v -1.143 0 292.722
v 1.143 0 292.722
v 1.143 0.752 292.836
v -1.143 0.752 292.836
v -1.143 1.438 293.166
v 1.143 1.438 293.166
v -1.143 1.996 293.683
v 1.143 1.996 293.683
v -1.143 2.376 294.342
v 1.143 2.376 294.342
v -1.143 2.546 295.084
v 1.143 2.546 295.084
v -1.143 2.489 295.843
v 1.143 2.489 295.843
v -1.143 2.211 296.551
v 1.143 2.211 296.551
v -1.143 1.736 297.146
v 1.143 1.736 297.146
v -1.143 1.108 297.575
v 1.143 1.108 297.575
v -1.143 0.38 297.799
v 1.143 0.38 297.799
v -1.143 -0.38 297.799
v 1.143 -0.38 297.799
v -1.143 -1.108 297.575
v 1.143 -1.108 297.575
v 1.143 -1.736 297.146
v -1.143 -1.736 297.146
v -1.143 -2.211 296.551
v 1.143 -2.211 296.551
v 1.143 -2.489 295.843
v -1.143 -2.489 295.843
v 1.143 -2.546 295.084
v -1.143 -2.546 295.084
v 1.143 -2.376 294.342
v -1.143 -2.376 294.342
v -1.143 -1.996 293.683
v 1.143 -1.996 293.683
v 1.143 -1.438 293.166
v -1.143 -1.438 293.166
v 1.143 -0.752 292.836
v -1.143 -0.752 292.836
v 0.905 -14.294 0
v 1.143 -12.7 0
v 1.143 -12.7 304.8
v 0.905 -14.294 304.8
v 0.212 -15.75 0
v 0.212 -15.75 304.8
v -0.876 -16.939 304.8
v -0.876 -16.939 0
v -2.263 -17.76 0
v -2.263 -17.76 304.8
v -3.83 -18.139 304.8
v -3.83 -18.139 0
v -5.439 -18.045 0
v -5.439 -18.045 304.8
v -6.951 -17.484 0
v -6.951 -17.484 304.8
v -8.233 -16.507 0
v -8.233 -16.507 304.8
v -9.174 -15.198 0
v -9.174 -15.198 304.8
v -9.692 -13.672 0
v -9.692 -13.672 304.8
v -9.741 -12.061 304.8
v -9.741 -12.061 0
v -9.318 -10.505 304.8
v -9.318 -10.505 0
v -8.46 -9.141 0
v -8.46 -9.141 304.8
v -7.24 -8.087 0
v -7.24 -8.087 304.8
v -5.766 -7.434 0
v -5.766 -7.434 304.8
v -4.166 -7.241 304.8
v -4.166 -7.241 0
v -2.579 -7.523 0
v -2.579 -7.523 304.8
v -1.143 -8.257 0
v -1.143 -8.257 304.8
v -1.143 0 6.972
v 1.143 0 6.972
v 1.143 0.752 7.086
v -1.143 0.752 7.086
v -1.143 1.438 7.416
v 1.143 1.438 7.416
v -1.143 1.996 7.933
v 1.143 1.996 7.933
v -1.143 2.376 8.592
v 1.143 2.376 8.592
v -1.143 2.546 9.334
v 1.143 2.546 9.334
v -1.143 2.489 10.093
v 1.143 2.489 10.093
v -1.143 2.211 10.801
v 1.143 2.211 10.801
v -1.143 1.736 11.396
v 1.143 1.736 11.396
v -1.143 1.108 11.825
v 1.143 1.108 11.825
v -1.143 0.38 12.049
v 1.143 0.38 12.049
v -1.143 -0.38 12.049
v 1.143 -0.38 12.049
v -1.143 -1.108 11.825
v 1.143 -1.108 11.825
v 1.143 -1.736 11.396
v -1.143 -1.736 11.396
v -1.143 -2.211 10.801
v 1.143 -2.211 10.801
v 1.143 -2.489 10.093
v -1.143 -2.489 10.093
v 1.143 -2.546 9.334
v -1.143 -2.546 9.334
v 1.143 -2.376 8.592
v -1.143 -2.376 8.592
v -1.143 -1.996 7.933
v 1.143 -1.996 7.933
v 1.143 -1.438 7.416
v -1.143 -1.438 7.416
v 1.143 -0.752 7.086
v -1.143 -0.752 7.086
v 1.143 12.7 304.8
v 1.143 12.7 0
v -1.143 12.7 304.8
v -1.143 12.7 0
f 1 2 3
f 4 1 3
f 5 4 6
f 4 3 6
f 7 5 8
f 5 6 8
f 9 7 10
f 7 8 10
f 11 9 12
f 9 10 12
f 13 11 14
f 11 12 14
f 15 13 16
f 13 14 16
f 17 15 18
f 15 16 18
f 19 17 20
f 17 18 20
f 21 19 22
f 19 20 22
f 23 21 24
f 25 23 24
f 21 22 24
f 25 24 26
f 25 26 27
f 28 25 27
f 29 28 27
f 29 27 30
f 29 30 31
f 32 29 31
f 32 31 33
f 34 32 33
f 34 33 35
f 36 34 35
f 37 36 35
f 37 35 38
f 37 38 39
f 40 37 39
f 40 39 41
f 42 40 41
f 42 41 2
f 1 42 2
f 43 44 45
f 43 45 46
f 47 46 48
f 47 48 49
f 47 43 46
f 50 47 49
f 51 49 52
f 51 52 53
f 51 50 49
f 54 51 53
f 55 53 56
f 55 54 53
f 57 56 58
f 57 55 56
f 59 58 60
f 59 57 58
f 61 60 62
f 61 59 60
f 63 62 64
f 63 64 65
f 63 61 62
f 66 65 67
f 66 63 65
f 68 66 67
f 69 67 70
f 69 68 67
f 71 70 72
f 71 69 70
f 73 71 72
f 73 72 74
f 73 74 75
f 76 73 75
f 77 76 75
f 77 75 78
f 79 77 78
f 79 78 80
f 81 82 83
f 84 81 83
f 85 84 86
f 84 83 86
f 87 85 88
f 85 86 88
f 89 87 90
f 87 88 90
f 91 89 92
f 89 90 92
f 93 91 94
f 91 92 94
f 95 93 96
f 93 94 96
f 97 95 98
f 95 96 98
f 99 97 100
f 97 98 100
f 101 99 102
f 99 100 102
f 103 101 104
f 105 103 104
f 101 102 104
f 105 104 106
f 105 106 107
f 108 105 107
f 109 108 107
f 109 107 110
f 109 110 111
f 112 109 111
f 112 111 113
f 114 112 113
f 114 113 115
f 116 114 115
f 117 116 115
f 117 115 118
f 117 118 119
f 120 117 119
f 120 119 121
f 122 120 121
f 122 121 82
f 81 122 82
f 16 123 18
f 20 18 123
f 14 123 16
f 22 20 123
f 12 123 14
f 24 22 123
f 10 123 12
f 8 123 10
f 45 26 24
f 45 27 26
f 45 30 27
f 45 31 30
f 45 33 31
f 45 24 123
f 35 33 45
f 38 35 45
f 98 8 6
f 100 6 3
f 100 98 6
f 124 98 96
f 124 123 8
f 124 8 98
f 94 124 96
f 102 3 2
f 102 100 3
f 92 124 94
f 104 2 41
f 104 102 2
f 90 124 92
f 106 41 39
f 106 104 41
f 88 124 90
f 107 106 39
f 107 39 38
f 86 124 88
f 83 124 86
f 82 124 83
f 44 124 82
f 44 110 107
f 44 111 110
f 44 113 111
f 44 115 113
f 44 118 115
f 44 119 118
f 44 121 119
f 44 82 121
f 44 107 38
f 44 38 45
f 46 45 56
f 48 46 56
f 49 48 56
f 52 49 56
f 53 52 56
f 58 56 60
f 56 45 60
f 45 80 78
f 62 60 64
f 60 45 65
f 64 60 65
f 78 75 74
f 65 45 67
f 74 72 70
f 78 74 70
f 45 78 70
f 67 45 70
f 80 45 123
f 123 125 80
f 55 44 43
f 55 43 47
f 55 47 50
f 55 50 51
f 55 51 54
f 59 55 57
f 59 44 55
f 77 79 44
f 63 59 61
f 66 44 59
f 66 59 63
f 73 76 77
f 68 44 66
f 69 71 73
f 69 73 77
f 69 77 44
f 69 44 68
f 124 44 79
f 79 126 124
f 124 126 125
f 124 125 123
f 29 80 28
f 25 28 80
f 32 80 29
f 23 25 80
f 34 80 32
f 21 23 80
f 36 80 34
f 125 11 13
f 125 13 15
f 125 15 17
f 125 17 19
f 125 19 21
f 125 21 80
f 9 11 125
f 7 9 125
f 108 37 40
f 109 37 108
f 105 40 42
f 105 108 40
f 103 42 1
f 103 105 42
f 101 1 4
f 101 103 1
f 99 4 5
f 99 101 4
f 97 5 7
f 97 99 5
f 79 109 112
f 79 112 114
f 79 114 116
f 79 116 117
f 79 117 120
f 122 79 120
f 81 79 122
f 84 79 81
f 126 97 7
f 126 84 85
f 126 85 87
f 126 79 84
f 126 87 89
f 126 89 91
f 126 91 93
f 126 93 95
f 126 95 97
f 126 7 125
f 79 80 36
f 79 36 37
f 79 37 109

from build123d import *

# Parameters (mm, degrees)
BOSS_EXTRUDE1_DEPTH    = 304.8
F_10_CLEARANCE_HOLE1_D = 5.1054


with BuildPart() as part:
    # Sketch1 → Boss-Extrude1 (new body)
    with BuildSketch(Plane.XY):
        with BuildLine():
            Line((-1.143, -8.256814656), (-1.143, 12.7))
            Line((-1.143, 12.7), (1.143, 12.7))
            Line((1.143, 12.7), (1.143, -12.7))
            ThreePointArc((1.143, -12.7), (-9.173985791, -15.198384078), (-1.143, -8.256814656))
        make_face()
    extrude(amount=BOSS_EXTRUDE1_DEPTH)

    # #10 Clearance Hole1 (through all)
    with Locations(Plane.ZY.offset(1.143)):
        with Locations((9.525, 0), (295.275, 0)):
            Hole(F_10_CLEARANCE_HOLE1_D / 2)


solid = part.part
